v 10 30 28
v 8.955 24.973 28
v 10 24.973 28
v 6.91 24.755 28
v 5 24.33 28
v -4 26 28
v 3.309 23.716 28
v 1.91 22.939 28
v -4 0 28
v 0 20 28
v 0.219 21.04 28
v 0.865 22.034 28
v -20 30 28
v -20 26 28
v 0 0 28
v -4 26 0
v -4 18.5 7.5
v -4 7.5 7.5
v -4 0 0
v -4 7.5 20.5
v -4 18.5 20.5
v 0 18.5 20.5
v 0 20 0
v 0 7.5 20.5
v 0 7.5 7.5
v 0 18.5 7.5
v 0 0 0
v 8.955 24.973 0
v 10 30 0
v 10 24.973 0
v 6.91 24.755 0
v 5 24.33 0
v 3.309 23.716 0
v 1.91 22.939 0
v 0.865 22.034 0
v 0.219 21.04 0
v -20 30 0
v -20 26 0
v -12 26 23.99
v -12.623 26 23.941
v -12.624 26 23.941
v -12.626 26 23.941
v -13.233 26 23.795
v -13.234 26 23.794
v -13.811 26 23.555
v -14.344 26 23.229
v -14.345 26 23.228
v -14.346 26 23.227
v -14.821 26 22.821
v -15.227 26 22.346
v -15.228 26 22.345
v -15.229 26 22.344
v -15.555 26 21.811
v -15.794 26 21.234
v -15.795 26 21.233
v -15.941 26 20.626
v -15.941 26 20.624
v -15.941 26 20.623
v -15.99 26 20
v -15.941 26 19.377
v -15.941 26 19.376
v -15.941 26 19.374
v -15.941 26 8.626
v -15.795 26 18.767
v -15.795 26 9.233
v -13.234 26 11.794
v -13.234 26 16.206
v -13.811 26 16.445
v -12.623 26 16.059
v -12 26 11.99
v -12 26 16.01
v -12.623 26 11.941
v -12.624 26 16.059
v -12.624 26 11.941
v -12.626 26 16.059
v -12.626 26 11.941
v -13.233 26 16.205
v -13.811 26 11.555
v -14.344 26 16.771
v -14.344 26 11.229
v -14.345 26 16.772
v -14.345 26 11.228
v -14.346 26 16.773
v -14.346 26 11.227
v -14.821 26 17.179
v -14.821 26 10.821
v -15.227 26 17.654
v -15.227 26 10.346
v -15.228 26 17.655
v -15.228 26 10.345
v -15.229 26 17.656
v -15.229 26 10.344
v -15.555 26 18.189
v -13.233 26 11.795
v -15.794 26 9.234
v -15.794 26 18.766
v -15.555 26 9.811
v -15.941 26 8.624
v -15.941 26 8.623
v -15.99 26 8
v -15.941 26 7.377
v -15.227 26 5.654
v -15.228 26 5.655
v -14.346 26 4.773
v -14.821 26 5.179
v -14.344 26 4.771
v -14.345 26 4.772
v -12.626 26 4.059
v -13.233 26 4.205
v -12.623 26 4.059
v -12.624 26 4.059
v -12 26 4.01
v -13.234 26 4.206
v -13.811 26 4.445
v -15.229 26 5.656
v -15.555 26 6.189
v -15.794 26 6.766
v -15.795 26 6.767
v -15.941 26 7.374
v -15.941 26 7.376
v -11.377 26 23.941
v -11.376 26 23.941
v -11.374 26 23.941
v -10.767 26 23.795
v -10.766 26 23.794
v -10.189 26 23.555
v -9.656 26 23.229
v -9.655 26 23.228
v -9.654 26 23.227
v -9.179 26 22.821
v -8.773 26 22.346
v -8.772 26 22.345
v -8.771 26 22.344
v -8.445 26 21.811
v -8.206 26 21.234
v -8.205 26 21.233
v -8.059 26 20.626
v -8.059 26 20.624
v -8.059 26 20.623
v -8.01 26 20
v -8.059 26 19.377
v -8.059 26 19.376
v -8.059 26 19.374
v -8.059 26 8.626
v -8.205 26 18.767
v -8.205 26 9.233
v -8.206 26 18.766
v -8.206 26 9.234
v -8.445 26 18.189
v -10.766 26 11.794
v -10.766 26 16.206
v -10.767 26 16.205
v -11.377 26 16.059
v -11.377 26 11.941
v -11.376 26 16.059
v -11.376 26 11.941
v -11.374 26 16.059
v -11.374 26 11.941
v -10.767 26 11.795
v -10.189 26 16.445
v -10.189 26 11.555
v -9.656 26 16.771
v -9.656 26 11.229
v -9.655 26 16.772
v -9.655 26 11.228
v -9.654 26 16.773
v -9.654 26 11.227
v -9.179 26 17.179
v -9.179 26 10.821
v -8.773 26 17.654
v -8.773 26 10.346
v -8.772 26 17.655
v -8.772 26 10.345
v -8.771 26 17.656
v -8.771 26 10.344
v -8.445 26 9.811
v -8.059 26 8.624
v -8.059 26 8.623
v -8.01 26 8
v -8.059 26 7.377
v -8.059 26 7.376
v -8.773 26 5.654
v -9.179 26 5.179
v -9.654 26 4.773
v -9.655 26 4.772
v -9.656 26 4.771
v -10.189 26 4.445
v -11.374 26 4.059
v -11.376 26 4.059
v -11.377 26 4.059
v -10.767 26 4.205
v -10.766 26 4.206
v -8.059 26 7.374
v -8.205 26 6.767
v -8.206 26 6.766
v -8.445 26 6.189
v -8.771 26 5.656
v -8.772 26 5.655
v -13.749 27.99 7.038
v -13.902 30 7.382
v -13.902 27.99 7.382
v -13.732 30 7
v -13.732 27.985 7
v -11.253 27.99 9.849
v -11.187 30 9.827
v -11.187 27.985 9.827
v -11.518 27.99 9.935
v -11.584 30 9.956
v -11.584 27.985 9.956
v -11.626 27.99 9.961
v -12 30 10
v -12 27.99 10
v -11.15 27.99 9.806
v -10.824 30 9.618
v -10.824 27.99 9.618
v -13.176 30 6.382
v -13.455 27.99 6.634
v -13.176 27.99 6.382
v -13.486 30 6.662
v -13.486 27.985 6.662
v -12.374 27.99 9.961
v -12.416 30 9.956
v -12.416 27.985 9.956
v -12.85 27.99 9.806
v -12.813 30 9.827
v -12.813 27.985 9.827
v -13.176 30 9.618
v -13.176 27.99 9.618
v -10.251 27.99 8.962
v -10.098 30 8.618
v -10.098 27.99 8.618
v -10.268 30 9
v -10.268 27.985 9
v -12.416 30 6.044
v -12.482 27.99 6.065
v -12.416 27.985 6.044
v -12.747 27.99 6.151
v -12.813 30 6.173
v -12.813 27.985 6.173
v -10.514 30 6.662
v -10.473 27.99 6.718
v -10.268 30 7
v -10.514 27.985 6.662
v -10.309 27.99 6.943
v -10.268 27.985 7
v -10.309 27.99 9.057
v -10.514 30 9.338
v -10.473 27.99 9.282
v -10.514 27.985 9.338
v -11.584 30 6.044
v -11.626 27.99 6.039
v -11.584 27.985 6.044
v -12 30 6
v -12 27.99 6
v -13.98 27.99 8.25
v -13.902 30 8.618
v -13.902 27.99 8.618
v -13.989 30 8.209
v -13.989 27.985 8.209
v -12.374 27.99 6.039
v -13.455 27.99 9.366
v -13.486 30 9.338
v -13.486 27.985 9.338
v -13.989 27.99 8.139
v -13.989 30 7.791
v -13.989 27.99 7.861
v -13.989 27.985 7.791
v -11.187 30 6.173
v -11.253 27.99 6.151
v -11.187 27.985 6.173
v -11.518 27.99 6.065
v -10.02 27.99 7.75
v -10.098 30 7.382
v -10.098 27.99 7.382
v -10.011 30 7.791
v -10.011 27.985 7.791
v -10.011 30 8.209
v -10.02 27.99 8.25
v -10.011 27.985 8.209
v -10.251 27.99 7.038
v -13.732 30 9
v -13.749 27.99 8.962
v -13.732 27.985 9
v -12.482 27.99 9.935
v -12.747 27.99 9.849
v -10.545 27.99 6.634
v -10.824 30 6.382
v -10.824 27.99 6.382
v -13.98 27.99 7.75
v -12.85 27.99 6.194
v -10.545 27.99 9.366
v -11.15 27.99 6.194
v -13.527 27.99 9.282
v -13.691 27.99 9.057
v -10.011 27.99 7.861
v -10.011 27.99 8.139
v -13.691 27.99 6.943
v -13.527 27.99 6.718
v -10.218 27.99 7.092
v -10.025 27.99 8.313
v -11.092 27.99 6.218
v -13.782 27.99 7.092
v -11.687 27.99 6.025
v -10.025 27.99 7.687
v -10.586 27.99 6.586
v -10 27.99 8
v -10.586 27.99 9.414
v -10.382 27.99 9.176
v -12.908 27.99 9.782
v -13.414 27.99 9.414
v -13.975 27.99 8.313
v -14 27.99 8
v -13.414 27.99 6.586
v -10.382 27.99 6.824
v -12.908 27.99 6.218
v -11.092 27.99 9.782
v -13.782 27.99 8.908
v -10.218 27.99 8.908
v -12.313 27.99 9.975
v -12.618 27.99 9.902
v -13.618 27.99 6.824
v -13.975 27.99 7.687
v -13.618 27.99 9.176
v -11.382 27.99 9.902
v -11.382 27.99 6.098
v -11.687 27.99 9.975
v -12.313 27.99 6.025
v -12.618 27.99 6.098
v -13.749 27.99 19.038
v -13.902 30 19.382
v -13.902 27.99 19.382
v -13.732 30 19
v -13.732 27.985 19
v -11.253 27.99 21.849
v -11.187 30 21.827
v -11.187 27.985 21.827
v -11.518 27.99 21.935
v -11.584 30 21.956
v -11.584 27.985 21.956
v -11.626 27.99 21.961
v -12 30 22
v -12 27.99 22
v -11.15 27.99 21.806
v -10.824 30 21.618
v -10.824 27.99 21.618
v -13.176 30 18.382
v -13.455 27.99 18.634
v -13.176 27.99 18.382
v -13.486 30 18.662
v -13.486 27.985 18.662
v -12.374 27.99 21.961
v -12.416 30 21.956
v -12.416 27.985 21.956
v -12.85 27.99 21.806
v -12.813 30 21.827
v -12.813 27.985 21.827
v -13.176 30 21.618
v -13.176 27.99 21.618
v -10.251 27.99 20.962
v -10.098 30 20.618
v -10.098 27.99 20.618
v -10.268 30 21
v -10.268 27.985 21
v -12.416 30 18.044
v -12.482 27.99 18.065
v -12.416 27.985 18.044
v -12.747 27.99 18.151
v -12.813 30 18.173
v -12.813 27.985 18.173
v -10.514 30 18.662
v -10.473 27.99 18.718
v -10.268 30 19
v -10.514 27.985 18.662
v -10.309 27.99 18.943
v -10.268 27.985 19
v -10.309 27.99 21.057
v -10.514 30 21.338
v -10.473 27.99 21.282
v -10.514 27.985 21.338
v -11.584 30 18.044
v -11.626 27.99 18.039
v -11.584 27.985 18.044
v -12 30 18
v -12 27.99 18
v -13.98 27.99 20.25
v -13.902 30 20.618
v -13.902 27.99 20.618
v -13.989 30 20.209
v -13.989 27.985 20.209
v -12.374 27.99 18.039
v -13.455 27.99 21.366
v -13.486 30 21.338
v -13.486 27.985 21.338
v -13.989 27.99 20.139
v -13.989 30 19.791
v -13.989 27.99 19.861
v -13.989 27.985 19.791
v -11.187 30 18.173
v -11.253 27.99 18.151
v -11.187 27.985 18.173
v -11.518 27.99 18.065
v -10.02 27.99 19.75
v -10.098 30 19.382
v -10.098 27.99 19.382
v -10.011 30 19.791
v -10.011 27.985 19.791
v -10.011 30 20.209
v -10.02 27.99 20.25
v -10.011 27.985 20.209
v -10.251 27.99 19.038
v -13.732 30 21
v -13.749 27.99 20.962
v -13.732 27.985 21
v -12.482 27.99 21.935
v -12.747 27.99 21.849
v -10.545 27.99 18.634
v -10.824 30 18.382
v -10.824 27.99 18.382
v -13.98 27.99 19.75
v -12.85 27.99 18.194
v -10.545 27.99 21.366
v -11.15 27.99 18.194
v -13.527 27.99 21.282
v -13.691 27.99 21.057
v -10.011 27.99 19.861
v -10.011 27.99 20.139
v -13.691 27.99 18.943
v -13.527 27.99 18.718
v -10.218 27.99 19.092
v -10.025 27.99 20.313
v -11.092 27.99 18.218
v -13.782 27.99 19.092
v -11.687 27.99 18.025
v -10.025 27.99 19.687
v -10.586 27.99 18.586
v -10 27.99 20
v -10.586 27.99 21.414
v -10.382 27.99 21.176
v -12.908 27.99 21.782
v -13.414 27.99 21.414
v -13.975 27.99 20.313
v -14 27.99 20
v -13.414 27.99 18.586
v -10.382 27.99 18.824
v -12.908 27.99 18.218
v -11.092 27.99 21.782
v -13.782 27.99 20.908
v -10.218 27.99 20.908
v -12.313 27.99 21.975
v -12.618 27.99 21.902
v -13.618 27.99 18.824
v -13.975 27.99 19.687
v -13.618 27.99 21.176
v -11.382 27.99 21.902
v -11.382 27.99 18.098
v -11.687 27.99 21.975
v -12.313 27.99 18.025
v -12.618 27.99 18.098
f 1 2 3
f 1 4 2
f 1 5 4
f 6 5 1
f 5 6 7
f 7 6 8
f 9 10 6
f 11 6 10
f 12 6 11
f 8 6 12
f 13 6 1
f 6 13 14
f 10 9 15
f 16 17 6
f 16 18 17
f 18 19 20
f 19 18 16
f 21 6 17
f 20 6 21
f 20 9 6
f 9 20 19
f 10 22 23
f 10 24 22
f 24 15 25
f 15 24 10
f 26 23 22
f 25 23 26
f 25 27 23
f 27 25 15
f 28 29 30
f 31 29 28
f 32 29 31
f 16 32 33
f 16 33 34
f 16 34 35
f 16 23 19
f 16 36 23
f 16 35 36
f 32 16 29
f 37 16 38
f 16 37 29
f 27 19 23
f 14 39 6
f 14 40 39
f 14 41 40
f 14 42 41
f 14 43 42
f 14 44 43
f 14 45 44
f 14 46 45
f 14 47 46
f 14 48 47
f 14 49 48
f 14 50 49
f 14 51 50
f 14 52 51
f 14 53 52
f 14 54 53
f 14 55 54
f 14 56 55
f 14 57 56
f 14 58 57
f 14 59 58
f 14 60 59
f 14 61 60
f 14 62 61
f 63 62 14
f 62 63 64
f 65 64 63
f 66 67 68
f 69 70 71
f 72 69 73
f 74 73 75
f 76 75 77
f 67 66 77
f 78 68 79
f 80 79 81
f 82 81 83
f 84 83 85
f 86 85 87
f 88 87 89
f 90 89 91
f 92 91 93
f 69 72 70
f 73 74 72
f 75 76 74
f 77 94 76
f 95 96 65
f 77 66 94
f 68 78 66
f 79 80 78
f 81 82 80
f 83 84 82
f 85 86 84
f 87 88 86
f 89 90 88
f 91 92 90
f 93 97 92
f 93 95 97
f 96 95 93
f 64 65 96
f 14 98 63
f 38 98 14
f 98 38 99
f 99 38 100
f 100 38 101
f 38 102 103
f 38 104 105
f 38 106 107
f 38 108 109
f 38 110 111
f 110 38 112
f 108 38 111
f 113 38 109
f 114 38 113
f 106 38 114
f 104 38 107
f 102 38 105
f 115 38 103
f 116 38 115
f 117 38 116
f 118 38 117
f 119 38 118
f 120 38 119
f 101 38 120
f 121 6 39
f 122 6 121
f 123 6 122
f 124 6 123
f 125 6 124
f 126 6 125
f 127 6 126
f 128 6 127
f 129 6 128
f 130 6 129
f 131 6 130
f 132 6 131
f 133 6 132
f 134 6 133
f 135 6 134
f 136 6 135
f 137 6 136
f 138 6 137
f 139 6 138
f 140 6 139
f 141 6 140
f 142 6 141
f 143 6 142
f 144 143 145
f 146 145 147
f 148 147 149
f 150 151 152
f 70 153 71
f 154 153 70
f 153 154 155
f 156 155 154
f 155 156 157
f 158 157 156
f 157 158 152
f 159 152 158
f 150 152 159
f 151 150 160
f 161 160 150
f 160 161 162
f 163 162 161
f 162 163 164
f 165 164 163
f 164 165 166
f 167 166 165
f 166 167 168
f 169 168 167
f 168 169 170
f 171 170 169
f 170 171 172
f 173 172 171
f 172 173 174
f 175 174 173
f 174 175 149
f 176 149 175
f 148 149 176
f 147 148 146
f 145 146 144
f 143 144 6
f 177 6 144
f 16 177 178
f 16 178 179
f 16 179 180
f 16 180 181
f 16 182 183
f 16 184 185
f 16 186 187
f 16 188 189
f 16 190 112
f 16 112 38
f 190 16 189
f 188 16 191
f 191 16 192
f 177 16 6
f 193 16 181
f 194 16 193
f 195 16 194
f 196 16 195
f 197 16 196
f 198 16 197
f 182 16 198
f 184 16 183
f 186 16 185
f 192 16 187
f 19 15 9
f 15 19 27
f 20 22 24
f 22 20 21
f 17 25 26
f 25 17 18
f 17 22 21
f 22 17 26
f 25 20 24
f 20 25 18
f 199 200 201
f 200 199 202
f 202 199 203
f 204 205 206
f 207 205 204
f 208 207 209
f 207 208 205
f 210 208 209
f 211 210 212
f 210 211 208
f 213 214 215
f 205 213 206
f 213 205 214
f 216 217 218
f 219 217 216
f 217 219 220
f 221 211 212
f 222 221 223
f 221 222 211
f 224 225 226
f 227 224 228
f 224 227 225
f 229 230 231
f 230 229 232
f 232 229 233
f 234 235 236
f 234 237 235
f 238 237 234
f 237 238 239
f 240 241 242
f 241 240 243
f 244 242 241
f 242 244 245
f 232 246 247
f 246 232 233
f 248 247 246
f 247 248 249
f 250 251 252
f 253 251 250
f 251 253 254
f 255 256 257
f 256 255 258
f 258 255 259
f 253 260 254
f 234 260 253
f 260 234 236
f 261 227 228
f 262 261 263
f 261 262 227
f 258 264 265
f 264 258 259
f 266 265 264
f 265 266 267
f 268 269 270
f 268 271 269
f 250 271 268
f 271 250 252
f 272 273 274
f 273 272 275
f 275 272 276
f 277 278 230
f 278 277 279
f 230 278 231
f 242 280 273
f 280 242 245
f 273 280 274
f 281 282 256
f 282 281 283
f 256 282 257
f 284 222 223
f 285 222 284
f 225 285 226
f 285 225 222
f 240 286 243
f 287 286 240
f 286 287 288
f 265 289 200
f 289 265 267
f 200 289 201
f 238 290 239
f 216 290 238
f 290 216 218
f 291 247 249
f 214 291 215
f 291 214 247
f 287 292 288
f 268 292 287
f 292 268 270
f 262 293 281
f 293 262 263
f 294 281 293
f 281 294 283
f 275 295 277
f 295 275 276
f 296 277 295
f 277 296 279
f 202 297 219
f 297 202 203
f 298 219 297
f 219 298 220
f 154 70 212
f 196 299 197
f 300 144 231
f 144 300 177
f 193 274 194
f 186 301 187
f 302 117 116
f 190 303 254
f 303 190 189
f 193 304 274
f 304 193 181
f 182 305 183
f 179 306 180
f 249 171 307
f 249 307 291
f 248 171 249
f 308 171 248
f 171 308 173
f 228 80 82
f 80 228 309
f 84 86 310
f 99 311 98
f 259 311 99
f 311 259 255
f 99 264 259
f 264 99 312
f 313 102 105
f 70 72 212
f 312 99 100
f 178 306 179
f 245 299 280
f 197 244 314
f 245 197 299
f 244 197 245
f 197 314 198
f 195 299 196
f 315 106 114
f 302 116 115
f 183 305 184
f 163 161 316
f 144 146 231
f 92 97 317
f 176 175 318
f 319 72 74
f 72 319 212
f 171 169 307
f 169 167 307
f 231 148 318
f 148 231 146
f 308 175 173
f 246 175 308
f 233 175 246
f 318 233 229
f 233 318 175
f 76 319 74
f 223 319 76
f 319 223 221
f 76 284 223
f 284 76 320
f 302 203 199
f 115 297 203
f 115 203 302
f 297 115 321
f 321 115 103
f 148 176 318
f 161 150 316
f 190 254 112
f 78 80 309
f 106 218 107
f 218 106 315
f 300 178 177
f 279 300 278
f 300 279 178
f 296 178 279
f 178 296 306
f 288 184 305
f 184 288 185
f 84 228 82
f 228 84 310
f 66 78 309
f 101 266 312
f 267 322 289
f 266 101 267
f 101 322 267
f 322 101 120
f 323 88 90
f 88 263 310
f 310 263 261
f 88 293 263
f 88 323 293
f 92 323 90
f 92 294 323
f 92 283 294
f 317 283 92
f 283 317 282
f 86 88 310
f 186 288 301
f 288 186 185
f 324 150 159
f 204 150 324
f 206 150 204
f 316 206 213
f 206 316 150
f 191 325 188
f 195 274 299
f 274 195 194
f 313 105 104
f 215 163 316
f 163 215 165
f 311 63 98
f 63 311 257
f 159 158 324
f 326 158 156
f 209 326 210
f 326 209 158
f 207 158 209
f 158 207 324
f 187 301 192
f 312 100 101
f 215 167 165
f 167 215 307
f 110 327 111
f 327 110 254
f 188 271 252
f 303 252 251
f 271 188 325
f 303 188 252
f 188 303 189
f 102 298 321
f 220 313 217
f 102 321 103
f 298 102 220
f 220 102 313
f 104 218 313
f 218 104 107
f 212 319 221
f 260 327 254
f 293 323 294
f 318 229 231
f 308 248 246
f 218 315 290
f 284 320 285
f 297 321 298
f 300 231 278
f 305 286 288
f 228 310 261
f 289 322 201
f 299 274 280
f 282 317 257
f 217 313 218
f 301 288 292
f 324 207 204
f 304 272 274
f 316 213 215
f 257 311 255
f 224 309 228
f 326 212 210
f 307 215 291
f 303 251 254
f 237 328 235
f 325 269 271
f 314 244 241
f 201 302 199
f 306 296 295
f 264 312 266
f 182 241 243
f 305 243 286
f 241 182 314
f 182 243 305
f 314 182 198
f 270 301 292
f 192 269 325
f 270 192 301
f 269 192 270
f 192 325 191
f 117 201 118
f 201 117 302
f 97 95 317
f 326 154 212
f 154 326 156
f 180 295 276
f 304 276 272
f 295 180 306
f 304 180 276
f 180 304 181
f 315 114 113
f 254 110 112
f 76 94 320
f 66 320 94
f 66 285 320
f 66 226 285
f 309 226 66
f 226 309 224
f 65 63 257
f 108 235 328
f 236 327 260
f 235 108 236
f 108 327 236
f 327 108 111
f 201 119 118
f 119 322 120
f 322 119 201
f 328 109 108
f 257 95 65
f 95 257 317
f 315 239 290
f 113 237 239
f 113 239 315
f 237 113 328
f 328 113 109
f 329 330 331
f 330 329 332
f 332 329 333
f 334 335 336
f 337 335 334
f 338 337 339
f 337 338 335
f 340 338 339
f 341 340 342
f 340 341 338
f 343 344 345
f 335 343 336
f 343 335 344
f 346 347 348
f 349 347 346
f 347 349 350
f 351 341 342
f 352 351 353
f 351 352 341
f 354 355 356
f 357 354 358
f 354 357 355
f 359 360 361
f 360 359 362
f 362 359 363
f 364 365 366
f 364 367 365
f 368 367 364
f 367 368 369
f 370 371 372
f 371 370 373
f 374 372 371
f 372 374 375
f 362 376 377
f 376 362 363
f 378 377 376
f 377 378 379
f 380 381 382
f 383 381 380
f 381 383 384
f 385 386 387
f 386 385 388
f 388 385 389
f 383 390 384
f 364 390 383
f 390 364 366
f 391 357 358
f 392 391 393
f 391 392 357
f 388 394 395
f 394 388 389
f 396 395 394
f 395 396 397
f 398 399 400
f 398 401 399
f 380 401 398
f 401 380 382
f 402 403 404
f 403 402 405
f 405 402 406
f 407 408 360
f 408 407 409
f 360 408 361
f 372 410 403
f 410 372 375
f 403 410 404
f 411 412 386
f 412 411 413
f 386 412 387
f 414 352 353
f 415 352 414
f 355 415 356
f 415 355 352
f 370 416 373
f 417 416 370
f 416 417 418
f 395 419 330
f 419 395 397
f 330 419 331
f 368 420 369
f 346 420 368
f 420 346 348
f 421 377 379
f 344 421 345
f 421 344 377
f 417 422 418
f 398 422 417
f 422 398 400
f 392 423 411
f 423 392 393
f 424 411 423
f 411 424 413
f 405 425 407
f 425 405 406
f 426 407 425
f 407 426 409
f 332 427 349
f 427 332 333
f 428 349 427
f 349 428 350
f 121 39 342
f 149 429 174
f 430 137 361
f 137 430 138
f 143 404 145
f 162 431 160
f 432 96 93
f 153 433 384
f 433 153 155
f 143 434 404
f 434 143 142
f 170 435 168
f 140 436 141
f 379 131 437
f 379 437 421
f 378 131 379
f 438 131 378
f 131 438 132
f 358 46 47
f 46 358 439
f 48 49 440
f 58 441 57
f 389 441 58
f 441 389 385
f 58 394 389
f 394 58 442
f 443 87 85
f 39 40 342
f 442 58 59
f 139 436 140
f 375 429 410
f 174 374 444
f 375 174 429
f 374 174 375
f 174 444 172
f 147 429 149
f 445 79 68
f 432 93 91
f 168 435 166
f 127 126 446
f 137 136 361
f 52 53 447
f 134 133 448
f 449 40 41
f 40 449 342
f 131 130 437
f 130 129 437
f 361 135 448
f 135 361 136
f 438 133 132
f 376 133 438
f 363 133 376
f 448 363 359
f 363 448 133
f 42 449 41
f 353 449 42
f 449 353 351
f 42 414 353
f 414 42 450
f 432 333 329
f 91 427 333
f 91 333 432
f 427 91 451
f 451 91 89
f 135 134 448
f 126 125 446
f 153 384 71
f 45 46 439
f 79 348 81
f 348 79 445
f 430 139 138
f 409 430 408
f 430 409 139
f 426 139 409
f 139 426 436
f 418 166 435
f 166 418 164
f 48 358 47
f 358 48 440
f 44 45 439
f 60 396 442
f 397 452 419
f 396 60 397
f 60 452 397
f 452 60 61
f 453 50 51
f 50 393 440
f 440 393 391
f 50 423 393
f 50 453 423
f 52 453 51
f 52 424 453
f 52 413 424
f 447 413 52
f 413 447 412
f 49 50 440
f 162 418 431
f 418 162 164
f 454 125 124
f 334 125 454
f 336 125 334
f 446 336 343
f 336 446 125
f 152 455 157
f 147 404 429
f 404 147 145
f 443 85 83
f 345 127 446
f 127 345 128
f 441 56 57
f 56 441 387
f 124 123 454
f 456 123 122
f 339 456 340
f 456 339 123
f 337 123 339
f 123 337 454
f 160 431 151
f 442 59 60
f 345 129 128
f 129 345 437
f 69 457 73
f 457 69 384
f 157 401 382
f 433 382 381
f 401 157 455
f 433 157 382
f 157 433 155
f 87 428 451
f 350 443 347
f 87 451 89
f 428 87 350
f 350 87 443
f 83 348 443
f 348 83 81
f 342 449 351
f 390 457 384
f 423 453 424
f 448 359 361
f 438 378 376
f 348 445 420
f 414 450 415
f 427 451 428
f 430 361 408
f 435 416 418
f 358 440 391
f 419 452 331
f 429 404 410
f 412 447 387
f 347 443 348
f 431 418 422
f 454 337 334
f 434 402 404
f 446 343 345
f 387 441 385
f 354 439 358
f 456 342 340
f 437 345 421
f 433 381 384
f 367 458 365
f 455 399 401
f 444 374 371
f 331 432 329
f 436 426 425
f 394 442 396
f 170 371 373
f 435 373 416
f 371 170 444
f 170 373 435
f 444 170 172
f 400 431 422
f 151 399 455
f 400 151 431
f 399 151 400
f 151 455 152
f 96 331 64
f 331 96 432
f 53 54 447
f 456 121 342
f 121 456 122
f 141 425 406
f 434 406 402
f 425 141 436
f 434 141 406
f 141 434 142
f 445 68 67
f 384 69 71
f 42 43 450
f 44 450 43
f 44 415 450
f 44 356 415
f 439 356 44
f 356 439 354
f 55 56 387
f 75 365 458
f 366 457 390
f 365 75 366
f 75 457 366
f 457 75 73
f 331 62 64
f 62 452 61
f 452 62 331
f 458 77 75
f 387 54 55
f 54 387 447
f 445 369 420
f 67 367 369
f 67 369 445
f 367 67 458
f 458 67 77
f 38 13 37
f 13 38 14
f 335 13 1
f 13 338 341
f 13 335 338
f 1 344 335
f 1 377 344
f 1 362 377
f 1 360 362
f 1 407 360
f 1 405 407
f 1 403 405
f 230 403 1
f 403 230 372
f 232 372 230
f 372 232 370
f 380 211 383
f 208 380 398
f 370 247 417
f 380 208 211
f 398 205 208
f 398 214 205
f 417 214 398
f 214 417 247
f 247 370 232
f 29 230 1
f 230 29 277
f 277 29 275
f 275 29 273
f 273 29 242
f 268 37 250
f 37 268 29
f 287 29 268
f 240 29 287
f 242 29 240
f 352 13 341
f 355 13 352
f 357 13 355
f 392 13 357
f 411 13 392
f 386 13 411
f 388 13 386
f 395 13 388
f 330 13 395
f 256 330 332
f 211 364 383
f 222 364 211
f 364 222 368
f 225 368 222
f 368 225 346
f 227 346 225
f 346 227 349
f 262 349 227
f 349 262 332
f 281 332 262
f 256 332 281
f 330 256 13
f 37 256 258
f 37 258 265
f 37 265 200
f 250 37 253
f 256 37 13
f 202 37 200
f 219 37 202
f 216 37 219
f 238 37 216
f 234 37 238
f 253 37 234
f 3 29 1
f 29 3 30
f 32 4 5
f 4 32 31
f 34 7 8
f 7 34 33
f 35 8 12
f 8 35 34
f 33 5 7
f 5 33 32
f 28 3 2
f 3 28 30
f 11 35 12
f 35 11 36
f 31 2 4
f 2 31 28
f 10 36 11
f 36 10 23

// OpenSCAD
rotate([0,-90])
{
difference(){
  cube([28,26,4]);
  translate([7.5,7.5,-.01]) cube([13,11,4.02]);
}
translate([0,26]) difference() {
  cube([28,4,20]);
  for(x=[8,20]) translate([x,-.01,12]) rotate([-90,0]) {
    cylinder(d=4,h=4.02,$fn=30);
    cylinder(d1=8,d2=4,h=2,$fn=40);
  }
}
translate([0,20,-10]) difference() {
  cube([28,10,10]);
  translate([-.01,0,0]) rotate([0,90,0]) scale([2,1]) cylinder(d=10,h=28.02,$fn=30);
}
}
